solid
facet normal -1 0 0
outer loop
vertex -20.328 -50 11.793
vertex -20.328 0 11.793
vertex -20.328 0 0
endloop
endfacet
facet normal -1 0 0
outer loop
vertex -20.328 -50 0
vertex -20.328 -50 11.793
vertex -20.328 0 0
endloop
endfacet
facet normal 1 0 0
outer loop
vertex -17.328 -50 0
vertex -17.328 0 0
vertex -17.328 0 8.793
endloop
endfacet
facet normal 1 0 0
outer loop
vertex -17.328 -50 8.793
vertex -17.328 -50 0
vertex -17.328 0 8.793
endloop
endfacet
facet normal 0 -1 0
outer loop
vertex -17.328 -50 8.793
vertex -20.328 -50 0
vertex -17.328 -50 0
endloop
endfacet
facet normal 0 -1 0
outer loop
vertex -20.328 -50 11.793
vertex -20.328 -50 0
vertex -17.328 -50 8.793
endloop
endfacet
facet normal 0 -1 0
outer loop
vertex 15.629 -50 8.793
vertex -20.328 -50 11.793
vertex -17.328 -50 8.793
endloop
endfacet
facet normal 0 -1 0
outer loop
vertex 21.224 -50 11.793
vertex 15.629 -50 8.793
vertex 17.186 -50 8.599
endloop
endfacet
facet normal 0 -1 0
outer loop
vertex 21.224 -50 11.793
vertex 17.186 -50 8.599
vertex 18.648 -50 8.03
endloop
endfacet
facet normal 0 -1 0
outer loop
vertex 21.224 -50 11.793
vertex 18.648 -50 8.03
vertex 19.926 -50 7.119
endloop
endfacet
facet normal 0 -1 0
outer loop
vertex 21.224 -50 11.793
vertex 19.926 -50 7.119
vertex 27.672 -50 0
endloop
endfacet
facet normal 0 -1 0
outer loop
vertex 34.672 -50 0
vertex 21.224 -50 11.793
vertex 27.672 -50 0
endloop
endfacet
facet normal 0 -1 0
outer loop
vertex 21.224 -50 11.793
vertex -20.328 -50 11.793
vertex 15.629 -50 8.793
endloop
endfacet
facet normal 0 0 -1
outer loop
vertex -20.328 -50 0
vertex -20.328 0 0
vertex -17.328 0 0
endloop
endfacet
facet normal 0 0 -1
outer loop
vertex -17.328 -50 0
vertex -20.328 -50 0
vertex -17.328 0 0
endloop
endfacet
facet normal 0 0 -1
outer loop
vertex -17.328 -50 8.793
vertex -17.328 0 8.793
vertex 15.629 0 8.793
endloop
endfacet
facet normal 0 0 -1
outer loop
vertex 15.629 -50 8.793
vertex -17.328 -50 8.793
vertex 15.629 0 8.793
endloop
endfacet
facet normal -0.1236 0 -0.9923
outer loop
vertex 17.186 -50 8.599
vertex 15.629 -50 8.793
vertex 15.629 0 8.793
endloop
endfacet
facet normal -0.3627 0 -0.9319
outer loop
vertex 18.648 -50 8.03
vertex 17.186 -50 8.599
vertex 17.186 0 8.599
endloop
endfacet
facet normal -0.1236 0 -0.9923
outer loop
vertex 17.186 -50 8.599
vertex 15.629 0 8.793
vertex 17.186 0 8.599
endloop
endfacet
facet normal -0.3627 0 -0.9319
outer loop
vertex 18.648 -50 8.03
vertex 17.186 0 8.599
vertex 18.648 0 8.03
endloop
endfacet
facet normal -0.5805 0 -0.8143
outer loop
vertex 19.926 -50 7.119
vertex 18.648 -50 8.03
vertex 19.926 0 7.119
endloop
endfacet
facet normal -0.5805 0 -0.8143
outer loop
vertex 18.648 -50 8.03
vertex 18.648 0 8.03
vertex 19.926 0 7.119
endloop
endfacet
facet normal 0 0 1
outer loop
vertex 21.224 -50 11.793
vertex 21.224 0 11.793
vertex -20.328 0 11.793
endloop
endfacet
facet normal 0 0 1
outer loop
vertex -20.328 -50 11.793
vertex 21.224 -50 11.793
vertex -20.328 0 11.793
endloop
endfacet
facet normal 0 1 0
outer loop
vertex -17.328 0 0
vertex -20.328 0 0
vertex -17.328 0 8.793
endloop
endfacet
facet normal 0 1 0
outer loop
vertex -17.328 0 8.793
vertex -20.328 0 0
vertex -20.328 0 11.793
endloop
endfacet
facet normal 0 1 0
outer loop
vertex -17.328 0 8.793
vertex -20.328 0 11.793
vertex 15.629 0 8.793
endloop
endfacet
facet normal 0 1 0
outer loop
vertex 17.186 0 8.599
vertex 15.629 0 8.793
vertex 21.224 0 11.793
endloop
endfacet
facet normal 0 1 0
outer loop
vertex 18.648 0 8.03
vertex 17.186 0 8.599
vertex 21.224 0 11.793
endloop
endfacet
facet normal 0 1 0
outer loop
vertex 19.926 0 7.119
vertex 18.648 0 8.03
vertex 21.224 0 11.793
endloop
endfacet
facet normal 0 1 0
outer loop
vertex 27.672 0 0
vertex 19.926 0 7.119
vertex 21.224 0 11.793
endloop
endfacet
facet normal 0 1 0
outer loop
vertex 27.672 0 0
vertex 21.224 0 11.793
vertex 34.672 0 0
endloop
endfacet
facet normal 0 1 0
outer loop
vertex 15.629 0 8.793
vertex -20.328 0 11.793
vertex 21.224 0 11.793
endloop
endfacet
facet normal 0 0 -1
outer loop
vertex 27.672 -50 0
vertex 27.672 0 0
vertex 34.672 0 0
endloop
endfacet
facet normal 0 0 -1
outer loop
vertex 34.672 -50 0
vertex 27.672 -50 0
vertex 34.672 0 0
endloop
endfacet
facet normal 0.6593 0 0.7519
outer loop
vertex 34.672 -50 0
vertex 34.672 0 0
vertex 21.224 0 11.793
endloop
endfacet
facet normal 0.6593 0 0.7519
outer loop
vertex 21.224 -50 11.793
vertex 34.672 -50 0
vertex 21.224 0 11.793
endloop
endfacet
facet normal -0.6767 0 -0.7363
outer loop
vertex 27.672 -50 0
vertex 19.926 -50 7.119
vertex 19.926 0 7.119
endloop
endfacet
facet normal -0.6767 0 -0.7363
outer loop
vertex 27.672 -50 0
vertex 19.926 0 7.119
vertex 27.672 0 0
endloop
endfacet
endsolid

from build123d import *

# Parameters (mm, degrees)
F1_DEPTH = 50


with BuildPart() as f1:
    # F0 (on Front) → F1 (new body)
    with BuildSketch(Plane.XZ):
        with BuildLine():
            Line((-20.327587, 11.793104), (-20.327587, 0))
            Line((-20.327587, 0), (-17.327587, 0))
            Line((-17.327587, 0), (-17.327587, 8.793104))
            Line((-17.327587, 8.793104), (15.628933, 8.793104))
            ThreePointArc((15.628933, 8.793104), (17.934571, 8.359736), (19.925504, 7.118783))
            Line((19.925504, 7.118783), (27.672413, 0))
            Line((27.672413, 0), (34.672413, 0))
            Line((34.672413, 0), (21.224136, 11.793104))
            Line((21.224136, 11.793104), (-20.327587, 11.793104))
        make_face()
    extrude(amount=F1_DEPTH)


solid = f1.part
